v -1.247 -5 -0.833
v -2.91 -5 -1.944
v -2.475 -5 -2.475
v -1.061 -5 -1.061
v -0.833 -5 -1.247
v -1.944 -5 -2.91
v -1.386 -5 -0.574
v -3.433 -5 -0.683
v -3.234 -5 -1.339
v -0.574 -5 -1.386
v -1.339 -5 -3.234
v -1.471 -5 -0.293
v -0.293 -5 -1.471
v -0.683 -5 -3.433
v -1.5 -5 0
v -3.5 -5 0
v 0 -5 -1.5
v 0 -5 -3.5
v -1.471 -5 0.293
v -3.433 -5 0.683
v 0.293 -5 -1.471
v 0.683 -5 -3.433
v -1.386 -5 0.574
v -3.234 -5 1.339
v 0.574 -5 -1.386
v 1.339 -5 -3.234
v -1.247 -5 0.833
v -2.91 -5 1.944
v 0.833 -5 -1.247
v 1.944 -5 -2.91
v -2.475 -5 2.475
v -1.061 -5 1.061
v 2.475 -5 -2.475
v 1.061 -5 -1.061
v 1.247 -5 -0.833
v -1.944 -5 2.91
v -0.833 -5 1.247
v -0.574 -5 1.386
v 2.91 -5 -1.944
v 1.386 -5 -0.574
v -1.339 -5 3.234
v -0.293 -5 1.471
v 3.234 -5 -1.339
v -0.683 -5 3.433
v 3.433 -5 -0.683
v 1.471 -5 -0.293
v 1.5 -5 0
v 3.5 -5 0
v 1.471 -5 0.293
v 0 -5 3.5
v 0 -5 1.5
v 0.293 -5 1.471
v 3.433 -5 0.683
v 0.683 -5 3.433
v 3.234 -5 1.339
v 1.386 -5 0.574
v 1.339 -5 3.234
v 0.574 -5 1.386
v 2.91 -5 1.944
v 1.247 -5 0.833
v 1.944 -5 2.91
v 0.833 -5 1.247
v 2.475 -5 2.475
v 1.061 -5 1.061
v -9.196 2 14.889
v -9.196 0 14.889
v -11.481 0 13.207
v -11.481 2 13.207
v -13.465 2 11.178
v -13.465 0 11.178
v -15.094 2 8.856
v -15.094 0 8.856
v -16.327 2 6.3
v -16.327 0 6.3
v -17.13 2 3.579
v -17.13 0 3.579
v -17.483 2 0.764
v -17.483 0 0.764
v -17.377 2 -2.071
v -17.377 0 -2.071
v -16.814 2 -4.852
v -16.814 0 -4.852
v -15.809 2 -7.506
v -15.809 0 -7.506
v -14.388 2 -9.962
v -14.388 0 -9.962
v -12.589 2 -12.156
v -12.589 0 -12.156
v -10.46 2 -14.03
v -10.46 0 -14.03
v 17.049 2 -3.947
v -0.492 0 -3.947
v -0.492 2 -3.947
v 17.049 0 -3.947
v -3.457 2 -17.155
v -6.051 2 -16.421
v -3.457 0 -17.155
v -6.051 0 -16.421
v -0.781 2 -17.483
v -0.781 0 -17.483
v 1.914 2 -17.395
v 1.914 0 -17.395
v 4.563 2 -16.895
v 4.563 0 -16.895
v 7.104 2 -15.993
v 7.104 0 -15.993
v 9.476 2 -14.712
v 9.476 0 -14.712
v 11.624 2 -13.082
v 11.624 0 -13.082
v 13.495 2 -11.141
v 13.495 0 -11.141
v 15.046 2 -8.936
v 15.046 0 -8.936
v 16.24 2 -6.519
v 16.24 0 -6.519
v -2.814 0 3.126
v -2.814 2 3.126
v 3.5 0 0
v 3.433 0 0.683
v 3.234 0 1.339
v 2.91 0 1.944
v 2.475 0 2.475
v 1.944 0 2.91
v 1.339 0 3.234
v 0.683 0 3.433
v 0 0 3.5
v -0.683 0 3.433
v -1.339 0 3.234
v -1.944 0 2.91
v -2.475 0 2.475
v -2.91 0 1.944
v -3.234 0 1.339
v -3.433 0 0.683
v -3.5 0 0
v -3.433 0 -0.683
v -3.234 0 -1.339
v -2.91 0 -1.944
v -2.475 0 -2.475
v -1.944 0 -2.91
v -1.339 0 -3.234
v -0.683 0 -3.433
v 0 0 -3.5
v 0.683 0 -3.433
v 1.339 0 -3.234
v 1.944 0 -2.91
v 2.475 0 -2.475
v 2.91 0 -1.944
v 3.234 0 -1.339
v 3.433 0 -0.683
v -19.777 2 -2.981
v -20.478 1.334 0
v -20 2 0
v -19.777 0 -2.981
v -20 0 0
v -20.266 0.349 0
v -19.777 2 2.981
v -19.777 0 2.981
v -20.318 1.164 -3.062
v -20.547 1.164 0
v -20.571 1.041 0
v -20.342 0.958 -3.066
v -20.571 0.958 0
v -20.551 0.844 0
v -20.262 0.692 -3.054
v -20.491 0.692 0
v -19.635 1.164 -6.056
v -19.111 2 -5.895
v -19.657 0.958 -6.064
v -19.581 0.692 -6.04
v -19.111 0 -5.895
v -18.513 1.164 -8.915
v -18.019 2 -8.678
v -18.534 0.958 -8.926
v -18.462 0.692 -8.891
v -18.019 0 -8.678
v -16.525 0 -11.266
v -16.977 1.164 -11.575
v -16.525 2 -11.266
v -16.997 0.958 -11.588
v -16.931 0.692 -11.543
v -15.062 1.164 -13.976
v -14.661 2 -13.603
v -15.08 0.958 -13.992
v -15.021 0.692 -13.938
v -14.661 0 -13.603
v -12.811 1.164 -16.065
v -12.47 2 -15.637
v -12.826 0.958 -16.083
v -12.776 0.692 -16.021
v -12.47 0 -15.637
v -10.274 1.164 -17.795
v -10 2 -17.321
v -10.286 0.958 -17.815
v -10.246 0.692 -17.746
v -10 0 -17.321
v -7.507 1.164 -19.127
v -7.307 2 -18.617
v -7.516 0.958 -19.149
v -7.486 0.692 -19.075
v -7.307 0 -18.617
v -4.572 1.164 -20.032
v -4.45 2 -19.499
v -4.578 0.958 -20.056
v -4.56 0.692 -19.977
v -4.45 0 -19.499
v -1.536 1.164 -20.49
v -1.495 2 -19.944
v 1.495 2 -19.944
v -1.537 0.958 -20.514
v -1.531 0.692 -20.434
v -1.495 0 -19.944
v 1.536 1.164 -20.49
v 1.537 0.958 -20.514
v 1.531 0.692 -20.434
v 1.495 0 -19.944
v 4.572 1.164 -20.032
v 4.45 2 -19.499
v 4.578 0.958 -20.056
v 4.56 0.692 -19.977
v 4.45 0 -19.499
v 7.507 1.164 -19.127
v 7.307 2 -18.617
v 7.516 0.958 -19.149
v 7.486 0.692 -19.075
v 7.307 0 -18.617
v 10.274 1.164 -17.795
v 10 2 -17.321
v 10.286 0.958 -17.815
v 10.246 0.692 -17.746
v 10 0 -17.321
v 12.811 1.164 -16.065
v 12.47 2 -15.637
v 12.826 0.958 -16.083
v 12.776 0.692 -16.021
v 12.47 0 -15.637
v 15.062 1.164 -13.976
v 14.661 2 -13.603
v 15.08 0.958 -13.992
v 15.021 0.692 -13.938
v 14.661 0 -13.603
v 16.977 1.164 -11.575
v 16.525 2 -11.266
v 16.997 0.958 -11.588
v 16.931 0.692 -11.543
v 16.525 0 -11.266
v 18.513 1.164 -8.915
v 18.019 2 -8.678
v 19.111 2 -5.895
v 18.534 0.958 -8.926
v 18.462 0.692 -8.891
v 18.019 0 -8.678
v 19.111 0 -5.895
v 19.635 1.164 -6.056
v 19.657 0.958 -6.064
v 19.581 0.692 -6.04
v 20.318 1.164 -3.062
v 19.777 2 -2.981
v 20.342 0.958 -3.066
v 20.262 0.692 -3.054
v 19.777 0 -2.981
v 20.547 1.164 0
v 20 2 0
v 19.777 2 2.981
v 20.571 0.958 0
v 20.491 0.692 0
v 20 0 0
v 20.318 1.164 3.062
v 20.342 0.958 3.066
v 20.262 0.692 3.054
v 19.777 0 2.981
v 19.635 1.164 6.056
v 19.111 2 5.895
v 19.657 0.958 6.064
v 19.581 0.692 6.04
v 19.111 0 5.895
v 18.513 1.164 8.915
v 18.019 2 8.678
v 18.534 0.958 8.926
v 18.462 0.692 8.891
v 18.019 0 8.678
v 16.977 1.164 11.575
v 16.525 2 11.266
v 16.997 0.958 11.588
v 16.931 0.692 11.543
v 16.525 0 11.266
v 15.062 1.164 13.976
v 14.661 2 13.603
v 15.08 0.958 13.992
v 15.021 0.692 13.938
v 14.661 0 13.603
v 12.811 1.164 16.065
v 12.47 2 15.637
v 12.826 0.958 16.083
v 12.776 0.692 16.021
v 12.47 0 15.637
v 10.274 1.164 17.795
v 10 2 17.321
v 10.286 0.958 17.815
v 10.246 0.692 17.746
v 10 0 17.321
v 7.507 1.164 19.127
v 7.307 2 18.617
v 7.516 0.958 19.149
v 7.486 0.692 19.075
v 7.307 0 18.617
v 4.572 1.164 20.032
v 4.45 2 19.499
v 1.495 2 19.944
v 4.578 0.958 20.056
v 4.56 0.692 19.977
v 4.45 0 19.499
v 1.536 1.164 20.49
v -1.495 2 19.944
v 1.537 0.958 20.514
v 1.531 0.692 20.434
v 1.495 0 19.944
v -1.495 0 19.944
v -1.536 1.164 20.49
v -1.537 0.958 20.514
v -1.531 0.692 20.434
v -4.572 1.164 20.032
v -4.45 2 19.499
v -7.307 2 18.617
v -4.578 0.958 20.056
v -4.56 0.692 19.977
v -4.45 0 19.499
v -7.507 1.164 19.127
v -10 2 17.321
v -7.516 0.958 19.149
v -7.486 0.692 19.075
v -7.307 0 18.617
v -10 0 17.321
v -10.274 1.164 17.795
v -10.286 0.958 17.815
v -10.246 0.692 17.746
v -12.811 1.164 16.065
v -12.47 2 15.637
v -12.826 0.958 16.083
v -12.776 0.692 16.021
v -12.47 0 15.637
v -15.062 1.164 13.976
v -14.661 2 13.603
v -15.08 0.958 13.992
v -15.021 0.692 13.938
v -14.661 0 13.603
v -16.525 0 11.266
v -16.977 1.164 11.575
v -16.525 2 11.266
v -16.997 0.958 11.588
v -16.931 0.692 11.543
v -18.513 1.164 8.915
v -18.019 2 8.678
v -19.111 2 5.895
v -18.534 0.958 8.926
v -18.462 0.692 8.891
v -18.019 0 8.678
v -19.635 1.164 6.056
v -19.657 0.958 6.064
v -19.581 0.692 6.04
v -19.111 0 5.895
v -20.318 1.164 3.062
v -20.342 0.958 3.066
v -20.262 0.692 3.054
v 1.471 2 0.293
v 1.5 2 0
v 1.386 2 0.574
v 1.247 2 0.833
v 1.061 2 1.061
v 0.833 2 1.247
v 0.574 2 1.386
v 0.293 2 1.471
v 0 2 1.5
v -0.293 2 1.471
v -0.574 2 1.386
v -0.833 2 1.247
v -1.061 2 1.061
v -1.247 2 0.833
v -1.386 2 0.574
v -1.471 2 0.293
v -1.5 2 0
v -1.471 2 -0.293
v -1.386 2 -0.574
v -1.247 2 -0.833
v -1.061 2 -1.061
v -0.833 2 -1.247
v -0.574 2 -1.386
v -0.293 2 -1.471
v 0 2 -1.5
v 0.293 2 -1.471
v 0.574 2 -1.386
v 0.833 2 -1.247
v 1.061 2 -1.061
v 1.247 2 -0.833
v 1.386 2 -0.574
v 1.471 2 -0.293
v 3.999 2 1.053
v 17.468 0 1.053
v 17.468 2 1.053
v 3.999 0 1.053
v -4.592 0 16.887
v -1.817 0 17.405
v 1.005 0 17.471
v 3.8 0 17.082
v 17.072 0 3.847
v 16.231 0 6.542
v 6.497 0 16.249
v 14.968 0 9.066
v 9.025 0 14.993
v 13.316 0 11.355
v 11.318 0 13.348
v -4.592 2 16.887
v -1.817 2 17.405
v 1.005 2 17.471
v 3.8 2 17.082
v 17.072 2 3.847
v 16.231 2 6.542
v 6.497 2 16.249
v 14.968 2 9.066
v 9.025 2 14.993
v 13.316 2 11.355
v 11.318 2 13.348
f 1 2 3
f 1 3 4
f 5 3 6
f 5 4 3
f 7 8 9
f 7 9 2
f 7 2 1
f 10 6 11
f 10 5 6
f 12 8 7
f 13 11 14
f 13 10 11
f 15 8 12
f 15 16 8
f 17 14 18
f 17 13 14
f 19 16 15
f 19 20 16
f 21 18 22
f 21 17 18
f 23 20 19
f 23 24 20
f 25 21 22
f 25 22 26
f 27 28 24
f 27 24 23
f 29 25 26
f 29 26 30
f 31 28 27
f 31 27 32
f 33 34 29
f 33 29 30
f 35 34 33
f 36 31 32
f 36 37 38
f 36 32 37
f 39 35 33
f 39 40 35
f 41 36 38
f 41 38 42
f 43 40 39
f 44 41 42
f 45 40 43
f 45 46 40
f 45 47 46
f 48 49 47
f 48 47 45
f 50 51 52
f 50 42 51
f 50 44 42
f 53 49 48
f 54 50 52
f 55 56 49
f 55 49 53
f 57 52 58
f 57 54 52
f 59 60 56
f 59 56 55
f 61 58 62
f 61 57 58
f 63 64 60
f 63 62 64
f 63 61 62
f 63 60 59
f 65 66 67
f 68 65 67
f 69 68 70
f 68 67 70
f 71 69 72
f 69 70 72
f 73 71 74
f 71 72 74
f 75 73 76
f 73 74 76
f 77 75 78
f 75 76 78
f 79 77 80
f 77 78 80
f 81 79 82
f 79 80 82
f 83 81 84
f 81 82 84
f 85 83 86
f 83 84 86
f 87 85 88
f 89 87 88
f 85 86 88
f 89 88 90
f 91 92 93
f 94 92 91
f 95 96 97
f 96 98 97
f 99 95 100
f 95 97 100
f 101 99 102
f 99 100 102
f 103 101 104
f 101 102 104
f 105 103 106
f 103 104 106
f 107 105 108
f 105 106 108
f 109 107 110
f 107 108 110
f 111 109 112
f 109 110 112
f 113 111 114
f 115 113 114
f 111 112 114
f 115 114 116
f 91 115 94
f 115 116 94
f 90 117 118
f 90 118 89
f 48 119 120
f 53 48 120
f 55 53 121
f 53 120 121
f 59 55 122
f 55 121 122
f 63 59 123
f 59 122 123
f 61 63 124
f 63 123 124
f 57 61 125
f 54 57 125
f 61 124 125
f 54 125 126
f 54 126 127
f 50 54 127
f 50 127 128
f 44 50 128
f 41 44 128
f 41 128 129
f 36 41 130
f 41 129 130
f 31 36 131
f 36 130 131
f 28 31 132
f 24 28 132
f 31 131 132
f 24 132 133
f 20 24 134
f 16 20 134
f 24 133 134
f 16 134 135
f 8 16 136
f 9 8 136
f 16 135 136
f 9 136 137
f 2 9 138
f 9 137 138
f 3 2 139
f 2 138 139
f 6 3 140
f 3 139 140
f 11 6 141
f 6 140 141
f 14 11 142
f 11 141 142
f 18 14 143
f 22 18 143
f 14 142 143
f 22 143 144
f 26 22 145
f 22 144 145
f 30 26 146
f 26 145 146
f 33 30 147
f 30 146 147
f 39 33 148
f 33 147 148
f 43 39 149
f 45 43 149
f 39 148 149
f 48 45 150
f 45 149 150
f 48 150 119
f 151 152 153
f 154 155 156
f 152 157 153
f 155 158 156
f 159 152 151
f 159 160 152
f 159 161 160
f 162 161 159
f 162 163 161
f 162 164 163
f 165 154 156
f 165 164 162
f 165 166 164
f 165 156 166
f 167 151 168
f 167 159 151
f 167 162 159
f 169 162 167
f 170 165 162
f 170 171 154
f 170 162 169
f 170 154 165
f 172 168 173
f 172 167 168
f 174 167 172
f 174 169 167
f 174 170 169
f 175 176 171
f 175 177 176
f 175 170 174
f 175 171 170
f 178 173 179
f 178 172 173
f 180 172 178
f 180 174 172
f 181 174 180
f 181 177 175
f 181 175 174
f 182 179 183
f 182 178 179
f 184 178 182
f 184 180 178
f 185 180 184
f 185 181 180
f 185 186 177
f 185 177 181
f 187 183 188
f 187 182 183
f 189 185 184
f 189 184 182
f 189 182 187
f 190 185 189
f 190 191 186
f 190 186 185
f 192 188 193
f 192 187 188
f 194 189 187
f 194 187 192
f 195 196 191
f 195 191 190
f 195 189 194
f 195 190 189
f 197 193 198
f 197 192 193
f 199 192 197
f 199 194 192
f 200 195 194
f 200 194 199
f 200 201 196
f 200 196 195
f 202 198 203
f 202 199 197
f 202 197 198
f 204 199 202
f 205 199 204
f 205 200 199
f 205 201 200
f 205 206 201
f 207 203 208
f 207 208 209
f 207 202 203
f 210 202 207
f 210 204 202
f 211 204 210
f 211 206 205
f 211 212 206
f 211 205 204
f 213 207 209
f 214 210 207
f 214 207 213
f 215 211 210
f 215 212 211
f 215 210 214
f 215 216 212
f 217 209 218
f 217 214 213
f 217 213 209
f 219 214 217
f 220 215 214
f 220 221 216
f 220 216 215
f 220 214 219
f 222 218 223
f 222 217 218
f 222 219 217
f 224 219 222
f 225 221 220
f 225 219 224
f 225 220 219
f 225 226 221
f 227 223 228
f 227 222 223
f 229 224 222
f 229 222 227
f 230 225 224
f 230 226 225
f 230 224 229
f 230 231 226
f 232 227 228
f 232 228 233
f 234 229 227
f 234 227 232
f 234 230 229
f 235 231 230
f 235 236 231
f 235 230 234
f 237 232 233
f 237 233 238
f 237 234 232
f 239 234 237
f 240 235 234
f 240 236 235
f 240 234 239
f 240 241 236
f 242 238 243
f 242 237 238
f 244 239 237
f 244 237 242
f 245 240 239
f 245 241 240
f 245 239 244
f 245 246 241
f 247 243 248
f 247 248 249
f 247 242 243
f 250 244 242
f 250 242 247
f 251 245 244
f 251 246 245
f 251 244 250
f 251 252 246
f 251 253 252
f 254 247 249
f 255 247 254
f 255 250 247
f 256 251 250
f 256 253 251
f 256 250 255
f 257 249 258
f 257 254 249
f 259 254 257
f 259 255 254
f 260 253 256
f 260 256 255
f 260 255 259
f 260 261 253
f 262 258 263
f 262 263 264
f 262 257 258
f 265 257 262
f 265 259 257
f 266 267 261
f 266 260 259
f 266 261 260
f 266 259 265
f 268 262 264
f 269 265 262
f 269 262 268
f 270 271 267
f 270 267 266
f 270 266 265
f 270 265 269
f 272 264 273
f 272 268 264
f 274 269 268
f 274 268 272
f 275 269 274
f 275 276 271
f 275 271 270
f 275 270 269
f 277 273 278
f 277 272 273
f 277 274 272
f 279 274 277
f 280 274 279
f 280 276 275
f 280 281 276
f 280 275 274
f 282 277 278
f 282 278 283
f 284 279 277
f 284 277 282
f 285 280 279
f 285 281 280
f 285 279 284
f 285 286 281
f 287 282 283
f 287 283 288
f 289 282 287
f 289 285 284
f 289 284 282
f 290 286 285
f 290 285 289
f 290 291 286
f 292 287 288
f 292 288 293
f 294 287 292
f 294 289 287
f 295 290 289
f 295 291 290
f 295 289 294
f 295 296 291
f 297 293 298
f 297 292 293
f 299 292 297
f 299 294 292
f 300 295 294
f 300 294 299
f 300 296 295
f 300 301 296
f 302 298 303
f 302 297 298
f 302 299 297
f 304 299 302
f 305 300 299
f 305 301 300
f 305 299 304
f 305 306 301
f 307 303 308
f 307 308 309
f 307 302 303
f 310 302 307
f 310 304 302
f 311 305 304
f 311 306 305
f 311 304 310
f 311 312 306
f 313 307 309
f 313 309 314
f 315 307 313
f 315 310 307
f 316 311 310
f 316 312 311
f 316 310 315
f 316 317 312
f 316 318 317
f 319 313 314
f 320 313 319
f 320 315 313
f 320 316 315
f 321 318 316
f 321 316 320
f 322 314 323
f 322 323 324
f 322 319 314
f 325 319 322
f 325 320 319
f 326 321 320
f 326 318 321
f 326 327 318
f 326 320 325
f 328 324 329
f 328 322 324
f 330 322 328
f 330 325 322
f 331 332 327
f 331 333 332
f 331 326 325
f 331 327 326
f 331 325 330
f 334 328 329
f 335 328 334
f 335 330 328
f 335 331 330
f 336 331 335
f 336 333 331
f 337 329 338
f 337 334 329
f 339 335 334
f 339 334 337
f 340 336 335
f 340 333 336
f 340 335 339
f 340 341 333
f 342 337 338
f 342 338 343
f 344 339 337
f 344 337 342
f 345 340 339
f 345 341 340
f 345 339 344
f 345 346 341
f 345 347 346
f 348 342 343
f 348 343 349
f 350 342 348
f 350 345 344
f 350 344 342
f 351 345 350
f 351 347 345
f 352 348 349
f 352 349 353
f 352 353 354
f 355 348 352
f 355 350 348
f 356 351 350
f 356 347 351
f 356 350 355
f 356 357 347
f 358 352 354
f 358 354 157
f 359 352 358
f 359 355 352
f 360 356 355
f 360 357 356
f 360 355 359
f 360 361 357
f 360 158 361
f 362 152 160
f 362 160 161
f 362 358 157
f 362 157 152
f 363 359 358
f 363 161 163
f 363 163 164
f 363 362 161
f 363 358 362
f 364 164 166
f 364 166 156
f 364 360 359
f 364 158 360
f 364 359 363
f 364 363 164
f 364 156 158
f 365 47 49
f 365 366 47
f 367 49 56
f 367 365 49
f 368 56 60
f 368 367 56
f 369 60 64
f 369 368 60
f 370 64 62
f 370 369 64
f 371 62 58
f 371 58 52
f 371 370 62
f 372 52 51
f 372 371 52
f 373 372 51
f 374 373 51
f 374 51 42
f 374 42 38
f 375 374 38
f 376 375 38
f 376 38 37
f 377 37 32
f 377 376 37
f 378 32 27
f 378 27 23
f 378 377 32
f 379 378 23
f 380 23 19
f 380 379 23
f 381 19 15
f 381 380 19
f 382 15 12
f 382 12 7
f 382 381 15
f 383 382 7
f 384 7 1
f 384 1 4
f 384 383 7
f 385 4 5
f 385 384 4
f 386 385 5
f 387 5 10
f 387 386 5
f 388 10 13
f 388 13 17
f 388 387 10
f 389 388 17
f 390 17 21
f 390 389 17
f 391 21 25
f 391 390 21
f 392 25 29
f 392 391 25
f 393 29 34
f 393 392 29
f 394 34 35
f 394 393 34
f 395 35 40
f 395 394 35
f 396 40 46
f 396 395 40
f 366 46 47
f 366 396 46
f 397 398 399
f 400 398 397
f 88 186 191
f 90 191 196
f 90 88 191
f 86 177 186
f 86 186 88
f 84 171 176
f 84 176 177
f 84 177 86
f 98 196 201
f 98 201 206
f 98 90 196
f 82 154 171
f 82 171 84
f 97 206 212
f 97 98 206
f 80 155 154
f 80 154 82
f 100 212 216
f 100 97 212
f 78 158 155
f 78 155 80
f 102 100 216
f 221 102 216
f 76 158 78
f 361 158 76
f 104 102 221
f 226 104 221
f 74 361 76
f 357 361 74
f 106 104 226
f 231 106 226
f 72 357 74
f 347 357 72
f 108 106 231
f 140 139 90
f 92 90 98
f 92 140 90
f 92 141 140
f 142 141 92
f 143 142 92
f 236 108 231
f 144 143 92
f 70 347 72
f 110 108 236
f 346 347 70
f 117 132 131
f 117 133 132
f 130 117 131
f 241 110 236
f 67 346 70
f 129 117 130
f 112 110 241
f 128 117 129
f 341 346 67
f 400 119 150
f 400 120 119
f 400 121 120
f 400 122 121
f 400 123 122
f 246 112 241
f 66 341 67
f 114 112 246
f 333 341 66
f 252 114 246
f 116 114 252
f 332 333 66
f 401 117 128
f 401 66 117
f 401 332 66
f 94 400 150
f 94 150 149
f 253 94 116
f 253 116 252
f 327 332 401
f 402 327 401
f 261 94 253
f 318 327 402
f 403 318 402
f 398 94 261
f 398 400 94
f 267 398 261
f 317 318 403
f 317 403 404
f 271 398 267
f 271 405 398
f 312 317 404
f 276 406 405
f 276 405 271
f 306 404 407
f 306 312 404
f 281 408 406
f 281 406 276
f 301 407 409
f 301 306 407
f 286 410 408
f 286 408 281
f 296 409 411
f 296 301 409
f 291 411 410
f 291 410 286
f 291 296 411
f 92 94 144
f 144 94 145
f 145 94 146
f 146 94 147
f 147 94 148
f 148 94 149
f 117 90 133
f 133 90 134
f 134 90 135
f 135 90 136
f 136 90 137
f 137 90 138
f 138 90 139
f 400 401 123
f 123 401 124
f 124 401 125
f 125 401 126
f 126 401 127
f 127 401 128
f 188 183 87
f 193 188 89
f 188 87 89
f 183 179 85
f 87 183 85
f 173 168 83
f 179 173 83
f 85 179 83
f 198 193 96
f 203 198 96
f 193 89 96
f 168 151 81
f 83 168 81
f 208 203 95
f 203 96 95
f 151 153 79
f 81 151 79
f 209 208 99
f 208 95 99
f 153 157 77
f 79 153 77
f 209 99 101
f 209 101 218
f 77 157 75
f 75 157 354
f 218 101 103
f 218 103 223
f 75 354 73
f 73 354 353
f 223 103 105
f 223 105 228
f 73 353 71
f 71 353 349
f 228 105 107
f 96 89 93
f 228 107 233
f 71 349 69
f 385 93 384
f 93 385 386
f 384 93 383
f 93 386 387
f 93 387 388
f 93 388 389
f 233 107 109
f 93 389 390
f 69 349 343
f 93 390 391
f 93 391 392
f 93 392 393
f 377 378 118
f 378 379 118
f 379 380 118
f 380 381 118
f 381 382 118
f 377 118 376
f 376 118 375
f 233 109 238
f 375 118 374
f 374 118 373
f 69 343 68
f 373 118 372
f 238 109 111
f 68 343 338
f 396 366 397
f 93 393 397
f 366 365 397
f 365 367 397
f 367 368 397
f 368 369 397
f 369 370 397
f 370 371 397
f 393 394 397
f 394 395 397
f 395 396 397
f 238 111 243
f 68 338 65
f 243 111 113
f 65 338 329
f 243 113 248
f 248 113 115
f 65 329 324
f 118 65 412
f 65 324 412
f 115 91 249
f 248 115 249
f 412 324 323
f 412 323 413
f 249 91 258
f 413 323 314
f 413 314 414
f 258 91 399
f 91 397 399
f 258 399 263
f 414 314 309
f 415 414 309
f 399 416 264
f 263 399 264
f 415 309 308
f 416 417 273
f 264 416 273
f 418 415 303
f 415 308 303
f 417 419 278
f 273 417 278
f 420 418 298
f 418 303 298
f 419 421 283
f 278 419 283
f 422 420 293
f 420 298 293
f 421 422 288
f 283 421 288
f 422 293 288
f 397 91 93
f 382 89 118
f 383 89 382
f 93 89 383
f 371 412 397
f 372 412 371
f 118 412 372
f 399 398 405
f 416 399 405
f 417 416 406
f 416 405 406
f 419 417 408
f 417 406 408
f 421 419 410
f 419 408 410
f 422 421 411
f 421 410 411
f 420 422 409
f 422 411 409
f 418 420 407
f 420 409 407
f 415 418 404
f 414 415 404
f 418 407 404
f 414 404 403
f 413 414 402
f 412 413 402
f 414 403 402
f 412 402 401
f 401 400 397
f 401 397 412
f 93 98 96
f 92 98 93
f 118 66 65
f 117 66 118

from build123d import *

# Parameters (mm, degrees)
F2_R     = 1.5
F2_R_2   = 17.5
F2_R_3   = 3.5
F3_DEPTH = 500
F5_DEPTH = 2
F6_DEPTH = 5025
F7_DEPTH = 5


with BuildPart() as f1:
    # F0 (on Top) → F1 (revolve)
    with BuildSketch(Plane.XY):
        with BuildLine():
            Line((-20, 0), (0, 0))
            Line((0, 0), (0, 2))
            Line((0, 2), (-20, 2))
            add(Edge.make_bspline(
                [(-20, 2), (-20.24486, 1.67319), (-20.903414, 0.985438), (-20.240018, 0.339687), (-20, 0)],
                knots=[0, 0, 0, 0, 1.159564, 2.304977, 2.304977, 2.304977, 2.304977], degree=3))
        make_face()
    revolve(axis=Axis((0, 1, 0), (0, -1, 0)))

    # F2 (on Front) → F3 (cut, symmetric)
    with BuildSketch(Plane.XZ):
        Circle(F2_R)
        Circle(F2_R_2)
        Circle(F2_R_3, mode=Mode.SUBTRACT)
    extrude(amount=F3_DEPTH, both=True, mode=Mode.SUBTRACT)

    # F4 (on Front) → F5 (join)
    with BuildSketch(Plane.XZ):
        Polygon((-2.813901, 3.125692), (-10.89626, -15.010192), (-6.329258, -17.045502), (-0.491874, -3.947084), (18.91508, -3.947084), (18.91508, 1.052916), (3.999229, 1.052916), (-5.120873, 17.862287), (-9.515686, 15.477835), align=None)
    extrude(amount=-F5_DEPTH)

    # F2 (on Front) → F6 (cut, symmetric)
    with BuildSketch(Plane.XZ):
        Circle(F2_R)
    extrude(amount=F6_DEPTH, both=True, mode=Mode.SUBTRACT)

    # F2 (on Front) → F7 (join)
    with BuildSketch(Plane.XZ):
        Circle(F2_R_3)
        Circle(F2_R, mode=Mode.SUBTRACT)
    extrude(amount=F7_DEPTH)


solid = f1.part
